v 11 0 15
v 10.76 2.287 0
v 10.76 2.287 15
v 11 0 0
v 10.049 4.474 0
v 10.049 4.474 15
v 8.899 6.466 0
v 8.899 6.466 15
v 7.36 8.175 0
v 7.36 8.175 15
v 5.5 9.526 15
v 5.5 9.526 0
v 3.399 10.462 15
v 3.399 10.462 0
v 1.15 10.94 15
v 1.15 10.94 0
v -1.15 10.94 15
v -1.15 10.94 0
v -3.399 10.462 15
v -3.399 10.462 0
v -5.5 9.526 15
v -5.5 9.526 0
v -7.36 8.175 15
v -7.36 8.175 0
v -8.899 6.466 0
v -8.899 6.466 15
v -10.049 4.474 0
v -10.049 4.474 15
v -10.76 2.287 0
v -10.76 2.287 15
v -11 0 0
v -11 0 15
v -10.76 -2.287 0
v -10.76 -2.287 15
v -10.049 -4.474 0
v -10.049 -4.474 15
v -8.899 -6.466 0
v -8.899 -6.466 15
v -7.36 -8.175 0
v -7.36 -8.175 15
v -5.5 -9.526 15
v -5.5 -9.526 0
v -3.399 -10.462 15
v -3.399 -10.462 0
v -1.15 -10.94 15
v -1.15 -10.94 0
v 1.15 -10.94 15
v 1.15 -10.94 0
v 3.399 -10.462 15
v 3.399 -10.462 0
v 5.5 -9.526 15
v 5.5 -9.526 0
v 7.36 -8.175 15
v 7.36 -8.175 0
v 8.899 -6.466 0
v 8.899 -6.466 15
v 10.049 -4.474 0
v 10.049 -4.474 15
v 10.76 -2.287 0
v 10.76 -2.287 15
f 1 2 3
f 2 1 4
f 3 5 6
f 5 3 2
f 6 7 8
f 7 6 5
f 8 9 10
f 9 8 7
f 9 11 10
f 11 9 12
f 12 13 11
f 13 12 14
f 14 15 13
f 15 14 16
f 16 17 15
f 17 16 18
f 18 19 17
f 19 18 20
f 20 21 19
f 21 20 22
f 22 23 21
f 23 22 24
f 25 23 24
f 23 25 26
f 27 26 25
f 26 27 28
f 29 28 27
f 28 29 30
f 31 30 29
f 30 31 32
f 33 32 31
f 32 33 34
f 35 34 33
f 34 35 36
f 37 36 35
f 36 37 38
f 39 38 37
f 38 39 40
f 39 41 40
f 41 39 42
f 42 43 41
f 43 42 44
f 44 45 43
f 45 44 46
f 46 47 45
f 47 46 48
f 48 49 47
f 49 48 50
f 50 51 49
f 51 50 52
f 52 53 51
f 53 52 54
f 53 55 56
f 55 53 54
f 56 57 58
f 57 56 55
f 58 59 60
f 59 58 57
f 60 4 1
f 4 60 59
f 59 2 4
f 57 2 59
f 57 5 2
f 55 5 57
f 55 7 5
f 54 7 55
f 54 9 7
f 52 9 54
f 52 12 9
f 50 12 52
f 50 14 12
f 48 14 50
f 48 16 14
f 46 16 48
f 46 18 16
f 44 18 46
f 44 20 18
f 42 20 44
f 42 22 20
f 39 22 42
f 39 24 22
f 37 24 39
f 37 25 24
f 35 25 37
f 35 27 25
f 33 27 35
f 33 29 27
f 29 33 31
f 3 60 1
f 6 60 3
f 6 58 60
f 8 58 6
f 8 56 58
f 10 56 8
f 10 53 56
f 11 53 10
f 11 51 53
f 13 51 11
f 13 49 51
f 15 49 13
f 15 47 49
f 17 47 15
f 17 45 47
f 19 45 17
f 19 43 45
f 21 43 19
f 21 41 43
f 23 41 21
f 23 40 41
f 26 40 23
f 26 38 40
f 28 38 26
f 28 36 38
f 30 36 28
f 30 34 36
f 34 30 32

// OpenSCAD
// Generated by SolidPython 1.0.1 on 2020-07-29 00:46:44


cylinder(h = 15, r1 = 11, r2 = 11);
/***********************************************
*********      SolidPython code:      **********
************************************************
 
# import packages: SolidPython
from solid import *
from solid.utils import *
from itertools import chain, combinations, permutations


class Resize:

    def __init__(self, scad_file):
        self.scad_file = scad_file
        #self.scad_file = import_scad(scad_file)
        # cone/cylinder param:
        self.r1 = 0
        self.r2 = 0
        self.h = 0
        # rectangular prism param:
        self.w = 0
        self.l = 0
        # ellipse param:
        self.r = 0

    # import OpenScad code (file name corresponds to shape)


    # classify shape + parameters
    def assign(self, param1, param2, param3):
        if self.scad_file == 'cone.scad':
            self.r1 = param1
            self.r2 = param2
            self.h = param3
        elif self.scad_file == 'cylinder.scad':
            self.r1 = param1
            self.r2 = param2
            self.h = param3
        elif self.scad_file == 'rectangularPrism.scad':
            self.h = param1
            self.l = param2
            self.w = param3
        else:
            self.r = param1
            self.h = param2

    # resize parameters
    def iterate(self):
        x = range(3, 20, 2)
        i = 1
        if self.scad_file == 'cone.scad':
            tempList = list(permutations(x, 2))
            for temp in tempList:
                param1 = temp[0]
                param2 = temp[1]
                filepath = 'produced_scad_files/' + 'cone' + str(param1) + '_' + str(param2) + '_' + '.scad'
                scad_render_to_file(cylinder(h=param1, r1=param2, r2=0), filepath)

        elif self.scad_file == 'cylinder.scad':
            tempList = list(permutations(x, 3))
            for temp in tempList:
                param1 = temp[0]
                param2 = temp[1]
                filepath = 'produced_scad_files/' + 'cylinder' + str(param1) + '_' + str(param2) + '_' + '.scad'
                scad_render_to_file(cylinder(h=param1, r1=param2, r2=param2), filepath)

        elif self.scad_file == 'rectangularPrism.scad':
            tempList = list(permutations(x, 3))
            for temp in tempList:
                param1 = temp[0]
                param2 = temp[1]
                param3 = temp[2]
                filepath = 'produced_scad_files/' + 'rectangularPrism' + str(param1) + '_' + str(param2) + '_' + str(
                    param3) + '.scad'
                scad_render_to_file(cube(size=(param1, param2, param3)), filepath)

        elif self.scad_file == 'ellipse.scad':
            tempList = list(permutations(x, 4))
            for temp in tempList:
                param1 = temp[0]
                param2 = temp[1]
                param3 = temp[2]
                param4 = temp[3]
                filepath = 'produced_scad_files/' + 'ellipse' + str(param1) + '_' + str(param2) + '_' + str(param3) + '_' + str(param4) + '.scad'
                scad_render_to_file(scale([param1, param2, param3])(sphere(r=param4)), filepath)

    def render_to_scadfile(self):
        scad_render_to_file(scad, 'example.scad') 
 
************************************************/
